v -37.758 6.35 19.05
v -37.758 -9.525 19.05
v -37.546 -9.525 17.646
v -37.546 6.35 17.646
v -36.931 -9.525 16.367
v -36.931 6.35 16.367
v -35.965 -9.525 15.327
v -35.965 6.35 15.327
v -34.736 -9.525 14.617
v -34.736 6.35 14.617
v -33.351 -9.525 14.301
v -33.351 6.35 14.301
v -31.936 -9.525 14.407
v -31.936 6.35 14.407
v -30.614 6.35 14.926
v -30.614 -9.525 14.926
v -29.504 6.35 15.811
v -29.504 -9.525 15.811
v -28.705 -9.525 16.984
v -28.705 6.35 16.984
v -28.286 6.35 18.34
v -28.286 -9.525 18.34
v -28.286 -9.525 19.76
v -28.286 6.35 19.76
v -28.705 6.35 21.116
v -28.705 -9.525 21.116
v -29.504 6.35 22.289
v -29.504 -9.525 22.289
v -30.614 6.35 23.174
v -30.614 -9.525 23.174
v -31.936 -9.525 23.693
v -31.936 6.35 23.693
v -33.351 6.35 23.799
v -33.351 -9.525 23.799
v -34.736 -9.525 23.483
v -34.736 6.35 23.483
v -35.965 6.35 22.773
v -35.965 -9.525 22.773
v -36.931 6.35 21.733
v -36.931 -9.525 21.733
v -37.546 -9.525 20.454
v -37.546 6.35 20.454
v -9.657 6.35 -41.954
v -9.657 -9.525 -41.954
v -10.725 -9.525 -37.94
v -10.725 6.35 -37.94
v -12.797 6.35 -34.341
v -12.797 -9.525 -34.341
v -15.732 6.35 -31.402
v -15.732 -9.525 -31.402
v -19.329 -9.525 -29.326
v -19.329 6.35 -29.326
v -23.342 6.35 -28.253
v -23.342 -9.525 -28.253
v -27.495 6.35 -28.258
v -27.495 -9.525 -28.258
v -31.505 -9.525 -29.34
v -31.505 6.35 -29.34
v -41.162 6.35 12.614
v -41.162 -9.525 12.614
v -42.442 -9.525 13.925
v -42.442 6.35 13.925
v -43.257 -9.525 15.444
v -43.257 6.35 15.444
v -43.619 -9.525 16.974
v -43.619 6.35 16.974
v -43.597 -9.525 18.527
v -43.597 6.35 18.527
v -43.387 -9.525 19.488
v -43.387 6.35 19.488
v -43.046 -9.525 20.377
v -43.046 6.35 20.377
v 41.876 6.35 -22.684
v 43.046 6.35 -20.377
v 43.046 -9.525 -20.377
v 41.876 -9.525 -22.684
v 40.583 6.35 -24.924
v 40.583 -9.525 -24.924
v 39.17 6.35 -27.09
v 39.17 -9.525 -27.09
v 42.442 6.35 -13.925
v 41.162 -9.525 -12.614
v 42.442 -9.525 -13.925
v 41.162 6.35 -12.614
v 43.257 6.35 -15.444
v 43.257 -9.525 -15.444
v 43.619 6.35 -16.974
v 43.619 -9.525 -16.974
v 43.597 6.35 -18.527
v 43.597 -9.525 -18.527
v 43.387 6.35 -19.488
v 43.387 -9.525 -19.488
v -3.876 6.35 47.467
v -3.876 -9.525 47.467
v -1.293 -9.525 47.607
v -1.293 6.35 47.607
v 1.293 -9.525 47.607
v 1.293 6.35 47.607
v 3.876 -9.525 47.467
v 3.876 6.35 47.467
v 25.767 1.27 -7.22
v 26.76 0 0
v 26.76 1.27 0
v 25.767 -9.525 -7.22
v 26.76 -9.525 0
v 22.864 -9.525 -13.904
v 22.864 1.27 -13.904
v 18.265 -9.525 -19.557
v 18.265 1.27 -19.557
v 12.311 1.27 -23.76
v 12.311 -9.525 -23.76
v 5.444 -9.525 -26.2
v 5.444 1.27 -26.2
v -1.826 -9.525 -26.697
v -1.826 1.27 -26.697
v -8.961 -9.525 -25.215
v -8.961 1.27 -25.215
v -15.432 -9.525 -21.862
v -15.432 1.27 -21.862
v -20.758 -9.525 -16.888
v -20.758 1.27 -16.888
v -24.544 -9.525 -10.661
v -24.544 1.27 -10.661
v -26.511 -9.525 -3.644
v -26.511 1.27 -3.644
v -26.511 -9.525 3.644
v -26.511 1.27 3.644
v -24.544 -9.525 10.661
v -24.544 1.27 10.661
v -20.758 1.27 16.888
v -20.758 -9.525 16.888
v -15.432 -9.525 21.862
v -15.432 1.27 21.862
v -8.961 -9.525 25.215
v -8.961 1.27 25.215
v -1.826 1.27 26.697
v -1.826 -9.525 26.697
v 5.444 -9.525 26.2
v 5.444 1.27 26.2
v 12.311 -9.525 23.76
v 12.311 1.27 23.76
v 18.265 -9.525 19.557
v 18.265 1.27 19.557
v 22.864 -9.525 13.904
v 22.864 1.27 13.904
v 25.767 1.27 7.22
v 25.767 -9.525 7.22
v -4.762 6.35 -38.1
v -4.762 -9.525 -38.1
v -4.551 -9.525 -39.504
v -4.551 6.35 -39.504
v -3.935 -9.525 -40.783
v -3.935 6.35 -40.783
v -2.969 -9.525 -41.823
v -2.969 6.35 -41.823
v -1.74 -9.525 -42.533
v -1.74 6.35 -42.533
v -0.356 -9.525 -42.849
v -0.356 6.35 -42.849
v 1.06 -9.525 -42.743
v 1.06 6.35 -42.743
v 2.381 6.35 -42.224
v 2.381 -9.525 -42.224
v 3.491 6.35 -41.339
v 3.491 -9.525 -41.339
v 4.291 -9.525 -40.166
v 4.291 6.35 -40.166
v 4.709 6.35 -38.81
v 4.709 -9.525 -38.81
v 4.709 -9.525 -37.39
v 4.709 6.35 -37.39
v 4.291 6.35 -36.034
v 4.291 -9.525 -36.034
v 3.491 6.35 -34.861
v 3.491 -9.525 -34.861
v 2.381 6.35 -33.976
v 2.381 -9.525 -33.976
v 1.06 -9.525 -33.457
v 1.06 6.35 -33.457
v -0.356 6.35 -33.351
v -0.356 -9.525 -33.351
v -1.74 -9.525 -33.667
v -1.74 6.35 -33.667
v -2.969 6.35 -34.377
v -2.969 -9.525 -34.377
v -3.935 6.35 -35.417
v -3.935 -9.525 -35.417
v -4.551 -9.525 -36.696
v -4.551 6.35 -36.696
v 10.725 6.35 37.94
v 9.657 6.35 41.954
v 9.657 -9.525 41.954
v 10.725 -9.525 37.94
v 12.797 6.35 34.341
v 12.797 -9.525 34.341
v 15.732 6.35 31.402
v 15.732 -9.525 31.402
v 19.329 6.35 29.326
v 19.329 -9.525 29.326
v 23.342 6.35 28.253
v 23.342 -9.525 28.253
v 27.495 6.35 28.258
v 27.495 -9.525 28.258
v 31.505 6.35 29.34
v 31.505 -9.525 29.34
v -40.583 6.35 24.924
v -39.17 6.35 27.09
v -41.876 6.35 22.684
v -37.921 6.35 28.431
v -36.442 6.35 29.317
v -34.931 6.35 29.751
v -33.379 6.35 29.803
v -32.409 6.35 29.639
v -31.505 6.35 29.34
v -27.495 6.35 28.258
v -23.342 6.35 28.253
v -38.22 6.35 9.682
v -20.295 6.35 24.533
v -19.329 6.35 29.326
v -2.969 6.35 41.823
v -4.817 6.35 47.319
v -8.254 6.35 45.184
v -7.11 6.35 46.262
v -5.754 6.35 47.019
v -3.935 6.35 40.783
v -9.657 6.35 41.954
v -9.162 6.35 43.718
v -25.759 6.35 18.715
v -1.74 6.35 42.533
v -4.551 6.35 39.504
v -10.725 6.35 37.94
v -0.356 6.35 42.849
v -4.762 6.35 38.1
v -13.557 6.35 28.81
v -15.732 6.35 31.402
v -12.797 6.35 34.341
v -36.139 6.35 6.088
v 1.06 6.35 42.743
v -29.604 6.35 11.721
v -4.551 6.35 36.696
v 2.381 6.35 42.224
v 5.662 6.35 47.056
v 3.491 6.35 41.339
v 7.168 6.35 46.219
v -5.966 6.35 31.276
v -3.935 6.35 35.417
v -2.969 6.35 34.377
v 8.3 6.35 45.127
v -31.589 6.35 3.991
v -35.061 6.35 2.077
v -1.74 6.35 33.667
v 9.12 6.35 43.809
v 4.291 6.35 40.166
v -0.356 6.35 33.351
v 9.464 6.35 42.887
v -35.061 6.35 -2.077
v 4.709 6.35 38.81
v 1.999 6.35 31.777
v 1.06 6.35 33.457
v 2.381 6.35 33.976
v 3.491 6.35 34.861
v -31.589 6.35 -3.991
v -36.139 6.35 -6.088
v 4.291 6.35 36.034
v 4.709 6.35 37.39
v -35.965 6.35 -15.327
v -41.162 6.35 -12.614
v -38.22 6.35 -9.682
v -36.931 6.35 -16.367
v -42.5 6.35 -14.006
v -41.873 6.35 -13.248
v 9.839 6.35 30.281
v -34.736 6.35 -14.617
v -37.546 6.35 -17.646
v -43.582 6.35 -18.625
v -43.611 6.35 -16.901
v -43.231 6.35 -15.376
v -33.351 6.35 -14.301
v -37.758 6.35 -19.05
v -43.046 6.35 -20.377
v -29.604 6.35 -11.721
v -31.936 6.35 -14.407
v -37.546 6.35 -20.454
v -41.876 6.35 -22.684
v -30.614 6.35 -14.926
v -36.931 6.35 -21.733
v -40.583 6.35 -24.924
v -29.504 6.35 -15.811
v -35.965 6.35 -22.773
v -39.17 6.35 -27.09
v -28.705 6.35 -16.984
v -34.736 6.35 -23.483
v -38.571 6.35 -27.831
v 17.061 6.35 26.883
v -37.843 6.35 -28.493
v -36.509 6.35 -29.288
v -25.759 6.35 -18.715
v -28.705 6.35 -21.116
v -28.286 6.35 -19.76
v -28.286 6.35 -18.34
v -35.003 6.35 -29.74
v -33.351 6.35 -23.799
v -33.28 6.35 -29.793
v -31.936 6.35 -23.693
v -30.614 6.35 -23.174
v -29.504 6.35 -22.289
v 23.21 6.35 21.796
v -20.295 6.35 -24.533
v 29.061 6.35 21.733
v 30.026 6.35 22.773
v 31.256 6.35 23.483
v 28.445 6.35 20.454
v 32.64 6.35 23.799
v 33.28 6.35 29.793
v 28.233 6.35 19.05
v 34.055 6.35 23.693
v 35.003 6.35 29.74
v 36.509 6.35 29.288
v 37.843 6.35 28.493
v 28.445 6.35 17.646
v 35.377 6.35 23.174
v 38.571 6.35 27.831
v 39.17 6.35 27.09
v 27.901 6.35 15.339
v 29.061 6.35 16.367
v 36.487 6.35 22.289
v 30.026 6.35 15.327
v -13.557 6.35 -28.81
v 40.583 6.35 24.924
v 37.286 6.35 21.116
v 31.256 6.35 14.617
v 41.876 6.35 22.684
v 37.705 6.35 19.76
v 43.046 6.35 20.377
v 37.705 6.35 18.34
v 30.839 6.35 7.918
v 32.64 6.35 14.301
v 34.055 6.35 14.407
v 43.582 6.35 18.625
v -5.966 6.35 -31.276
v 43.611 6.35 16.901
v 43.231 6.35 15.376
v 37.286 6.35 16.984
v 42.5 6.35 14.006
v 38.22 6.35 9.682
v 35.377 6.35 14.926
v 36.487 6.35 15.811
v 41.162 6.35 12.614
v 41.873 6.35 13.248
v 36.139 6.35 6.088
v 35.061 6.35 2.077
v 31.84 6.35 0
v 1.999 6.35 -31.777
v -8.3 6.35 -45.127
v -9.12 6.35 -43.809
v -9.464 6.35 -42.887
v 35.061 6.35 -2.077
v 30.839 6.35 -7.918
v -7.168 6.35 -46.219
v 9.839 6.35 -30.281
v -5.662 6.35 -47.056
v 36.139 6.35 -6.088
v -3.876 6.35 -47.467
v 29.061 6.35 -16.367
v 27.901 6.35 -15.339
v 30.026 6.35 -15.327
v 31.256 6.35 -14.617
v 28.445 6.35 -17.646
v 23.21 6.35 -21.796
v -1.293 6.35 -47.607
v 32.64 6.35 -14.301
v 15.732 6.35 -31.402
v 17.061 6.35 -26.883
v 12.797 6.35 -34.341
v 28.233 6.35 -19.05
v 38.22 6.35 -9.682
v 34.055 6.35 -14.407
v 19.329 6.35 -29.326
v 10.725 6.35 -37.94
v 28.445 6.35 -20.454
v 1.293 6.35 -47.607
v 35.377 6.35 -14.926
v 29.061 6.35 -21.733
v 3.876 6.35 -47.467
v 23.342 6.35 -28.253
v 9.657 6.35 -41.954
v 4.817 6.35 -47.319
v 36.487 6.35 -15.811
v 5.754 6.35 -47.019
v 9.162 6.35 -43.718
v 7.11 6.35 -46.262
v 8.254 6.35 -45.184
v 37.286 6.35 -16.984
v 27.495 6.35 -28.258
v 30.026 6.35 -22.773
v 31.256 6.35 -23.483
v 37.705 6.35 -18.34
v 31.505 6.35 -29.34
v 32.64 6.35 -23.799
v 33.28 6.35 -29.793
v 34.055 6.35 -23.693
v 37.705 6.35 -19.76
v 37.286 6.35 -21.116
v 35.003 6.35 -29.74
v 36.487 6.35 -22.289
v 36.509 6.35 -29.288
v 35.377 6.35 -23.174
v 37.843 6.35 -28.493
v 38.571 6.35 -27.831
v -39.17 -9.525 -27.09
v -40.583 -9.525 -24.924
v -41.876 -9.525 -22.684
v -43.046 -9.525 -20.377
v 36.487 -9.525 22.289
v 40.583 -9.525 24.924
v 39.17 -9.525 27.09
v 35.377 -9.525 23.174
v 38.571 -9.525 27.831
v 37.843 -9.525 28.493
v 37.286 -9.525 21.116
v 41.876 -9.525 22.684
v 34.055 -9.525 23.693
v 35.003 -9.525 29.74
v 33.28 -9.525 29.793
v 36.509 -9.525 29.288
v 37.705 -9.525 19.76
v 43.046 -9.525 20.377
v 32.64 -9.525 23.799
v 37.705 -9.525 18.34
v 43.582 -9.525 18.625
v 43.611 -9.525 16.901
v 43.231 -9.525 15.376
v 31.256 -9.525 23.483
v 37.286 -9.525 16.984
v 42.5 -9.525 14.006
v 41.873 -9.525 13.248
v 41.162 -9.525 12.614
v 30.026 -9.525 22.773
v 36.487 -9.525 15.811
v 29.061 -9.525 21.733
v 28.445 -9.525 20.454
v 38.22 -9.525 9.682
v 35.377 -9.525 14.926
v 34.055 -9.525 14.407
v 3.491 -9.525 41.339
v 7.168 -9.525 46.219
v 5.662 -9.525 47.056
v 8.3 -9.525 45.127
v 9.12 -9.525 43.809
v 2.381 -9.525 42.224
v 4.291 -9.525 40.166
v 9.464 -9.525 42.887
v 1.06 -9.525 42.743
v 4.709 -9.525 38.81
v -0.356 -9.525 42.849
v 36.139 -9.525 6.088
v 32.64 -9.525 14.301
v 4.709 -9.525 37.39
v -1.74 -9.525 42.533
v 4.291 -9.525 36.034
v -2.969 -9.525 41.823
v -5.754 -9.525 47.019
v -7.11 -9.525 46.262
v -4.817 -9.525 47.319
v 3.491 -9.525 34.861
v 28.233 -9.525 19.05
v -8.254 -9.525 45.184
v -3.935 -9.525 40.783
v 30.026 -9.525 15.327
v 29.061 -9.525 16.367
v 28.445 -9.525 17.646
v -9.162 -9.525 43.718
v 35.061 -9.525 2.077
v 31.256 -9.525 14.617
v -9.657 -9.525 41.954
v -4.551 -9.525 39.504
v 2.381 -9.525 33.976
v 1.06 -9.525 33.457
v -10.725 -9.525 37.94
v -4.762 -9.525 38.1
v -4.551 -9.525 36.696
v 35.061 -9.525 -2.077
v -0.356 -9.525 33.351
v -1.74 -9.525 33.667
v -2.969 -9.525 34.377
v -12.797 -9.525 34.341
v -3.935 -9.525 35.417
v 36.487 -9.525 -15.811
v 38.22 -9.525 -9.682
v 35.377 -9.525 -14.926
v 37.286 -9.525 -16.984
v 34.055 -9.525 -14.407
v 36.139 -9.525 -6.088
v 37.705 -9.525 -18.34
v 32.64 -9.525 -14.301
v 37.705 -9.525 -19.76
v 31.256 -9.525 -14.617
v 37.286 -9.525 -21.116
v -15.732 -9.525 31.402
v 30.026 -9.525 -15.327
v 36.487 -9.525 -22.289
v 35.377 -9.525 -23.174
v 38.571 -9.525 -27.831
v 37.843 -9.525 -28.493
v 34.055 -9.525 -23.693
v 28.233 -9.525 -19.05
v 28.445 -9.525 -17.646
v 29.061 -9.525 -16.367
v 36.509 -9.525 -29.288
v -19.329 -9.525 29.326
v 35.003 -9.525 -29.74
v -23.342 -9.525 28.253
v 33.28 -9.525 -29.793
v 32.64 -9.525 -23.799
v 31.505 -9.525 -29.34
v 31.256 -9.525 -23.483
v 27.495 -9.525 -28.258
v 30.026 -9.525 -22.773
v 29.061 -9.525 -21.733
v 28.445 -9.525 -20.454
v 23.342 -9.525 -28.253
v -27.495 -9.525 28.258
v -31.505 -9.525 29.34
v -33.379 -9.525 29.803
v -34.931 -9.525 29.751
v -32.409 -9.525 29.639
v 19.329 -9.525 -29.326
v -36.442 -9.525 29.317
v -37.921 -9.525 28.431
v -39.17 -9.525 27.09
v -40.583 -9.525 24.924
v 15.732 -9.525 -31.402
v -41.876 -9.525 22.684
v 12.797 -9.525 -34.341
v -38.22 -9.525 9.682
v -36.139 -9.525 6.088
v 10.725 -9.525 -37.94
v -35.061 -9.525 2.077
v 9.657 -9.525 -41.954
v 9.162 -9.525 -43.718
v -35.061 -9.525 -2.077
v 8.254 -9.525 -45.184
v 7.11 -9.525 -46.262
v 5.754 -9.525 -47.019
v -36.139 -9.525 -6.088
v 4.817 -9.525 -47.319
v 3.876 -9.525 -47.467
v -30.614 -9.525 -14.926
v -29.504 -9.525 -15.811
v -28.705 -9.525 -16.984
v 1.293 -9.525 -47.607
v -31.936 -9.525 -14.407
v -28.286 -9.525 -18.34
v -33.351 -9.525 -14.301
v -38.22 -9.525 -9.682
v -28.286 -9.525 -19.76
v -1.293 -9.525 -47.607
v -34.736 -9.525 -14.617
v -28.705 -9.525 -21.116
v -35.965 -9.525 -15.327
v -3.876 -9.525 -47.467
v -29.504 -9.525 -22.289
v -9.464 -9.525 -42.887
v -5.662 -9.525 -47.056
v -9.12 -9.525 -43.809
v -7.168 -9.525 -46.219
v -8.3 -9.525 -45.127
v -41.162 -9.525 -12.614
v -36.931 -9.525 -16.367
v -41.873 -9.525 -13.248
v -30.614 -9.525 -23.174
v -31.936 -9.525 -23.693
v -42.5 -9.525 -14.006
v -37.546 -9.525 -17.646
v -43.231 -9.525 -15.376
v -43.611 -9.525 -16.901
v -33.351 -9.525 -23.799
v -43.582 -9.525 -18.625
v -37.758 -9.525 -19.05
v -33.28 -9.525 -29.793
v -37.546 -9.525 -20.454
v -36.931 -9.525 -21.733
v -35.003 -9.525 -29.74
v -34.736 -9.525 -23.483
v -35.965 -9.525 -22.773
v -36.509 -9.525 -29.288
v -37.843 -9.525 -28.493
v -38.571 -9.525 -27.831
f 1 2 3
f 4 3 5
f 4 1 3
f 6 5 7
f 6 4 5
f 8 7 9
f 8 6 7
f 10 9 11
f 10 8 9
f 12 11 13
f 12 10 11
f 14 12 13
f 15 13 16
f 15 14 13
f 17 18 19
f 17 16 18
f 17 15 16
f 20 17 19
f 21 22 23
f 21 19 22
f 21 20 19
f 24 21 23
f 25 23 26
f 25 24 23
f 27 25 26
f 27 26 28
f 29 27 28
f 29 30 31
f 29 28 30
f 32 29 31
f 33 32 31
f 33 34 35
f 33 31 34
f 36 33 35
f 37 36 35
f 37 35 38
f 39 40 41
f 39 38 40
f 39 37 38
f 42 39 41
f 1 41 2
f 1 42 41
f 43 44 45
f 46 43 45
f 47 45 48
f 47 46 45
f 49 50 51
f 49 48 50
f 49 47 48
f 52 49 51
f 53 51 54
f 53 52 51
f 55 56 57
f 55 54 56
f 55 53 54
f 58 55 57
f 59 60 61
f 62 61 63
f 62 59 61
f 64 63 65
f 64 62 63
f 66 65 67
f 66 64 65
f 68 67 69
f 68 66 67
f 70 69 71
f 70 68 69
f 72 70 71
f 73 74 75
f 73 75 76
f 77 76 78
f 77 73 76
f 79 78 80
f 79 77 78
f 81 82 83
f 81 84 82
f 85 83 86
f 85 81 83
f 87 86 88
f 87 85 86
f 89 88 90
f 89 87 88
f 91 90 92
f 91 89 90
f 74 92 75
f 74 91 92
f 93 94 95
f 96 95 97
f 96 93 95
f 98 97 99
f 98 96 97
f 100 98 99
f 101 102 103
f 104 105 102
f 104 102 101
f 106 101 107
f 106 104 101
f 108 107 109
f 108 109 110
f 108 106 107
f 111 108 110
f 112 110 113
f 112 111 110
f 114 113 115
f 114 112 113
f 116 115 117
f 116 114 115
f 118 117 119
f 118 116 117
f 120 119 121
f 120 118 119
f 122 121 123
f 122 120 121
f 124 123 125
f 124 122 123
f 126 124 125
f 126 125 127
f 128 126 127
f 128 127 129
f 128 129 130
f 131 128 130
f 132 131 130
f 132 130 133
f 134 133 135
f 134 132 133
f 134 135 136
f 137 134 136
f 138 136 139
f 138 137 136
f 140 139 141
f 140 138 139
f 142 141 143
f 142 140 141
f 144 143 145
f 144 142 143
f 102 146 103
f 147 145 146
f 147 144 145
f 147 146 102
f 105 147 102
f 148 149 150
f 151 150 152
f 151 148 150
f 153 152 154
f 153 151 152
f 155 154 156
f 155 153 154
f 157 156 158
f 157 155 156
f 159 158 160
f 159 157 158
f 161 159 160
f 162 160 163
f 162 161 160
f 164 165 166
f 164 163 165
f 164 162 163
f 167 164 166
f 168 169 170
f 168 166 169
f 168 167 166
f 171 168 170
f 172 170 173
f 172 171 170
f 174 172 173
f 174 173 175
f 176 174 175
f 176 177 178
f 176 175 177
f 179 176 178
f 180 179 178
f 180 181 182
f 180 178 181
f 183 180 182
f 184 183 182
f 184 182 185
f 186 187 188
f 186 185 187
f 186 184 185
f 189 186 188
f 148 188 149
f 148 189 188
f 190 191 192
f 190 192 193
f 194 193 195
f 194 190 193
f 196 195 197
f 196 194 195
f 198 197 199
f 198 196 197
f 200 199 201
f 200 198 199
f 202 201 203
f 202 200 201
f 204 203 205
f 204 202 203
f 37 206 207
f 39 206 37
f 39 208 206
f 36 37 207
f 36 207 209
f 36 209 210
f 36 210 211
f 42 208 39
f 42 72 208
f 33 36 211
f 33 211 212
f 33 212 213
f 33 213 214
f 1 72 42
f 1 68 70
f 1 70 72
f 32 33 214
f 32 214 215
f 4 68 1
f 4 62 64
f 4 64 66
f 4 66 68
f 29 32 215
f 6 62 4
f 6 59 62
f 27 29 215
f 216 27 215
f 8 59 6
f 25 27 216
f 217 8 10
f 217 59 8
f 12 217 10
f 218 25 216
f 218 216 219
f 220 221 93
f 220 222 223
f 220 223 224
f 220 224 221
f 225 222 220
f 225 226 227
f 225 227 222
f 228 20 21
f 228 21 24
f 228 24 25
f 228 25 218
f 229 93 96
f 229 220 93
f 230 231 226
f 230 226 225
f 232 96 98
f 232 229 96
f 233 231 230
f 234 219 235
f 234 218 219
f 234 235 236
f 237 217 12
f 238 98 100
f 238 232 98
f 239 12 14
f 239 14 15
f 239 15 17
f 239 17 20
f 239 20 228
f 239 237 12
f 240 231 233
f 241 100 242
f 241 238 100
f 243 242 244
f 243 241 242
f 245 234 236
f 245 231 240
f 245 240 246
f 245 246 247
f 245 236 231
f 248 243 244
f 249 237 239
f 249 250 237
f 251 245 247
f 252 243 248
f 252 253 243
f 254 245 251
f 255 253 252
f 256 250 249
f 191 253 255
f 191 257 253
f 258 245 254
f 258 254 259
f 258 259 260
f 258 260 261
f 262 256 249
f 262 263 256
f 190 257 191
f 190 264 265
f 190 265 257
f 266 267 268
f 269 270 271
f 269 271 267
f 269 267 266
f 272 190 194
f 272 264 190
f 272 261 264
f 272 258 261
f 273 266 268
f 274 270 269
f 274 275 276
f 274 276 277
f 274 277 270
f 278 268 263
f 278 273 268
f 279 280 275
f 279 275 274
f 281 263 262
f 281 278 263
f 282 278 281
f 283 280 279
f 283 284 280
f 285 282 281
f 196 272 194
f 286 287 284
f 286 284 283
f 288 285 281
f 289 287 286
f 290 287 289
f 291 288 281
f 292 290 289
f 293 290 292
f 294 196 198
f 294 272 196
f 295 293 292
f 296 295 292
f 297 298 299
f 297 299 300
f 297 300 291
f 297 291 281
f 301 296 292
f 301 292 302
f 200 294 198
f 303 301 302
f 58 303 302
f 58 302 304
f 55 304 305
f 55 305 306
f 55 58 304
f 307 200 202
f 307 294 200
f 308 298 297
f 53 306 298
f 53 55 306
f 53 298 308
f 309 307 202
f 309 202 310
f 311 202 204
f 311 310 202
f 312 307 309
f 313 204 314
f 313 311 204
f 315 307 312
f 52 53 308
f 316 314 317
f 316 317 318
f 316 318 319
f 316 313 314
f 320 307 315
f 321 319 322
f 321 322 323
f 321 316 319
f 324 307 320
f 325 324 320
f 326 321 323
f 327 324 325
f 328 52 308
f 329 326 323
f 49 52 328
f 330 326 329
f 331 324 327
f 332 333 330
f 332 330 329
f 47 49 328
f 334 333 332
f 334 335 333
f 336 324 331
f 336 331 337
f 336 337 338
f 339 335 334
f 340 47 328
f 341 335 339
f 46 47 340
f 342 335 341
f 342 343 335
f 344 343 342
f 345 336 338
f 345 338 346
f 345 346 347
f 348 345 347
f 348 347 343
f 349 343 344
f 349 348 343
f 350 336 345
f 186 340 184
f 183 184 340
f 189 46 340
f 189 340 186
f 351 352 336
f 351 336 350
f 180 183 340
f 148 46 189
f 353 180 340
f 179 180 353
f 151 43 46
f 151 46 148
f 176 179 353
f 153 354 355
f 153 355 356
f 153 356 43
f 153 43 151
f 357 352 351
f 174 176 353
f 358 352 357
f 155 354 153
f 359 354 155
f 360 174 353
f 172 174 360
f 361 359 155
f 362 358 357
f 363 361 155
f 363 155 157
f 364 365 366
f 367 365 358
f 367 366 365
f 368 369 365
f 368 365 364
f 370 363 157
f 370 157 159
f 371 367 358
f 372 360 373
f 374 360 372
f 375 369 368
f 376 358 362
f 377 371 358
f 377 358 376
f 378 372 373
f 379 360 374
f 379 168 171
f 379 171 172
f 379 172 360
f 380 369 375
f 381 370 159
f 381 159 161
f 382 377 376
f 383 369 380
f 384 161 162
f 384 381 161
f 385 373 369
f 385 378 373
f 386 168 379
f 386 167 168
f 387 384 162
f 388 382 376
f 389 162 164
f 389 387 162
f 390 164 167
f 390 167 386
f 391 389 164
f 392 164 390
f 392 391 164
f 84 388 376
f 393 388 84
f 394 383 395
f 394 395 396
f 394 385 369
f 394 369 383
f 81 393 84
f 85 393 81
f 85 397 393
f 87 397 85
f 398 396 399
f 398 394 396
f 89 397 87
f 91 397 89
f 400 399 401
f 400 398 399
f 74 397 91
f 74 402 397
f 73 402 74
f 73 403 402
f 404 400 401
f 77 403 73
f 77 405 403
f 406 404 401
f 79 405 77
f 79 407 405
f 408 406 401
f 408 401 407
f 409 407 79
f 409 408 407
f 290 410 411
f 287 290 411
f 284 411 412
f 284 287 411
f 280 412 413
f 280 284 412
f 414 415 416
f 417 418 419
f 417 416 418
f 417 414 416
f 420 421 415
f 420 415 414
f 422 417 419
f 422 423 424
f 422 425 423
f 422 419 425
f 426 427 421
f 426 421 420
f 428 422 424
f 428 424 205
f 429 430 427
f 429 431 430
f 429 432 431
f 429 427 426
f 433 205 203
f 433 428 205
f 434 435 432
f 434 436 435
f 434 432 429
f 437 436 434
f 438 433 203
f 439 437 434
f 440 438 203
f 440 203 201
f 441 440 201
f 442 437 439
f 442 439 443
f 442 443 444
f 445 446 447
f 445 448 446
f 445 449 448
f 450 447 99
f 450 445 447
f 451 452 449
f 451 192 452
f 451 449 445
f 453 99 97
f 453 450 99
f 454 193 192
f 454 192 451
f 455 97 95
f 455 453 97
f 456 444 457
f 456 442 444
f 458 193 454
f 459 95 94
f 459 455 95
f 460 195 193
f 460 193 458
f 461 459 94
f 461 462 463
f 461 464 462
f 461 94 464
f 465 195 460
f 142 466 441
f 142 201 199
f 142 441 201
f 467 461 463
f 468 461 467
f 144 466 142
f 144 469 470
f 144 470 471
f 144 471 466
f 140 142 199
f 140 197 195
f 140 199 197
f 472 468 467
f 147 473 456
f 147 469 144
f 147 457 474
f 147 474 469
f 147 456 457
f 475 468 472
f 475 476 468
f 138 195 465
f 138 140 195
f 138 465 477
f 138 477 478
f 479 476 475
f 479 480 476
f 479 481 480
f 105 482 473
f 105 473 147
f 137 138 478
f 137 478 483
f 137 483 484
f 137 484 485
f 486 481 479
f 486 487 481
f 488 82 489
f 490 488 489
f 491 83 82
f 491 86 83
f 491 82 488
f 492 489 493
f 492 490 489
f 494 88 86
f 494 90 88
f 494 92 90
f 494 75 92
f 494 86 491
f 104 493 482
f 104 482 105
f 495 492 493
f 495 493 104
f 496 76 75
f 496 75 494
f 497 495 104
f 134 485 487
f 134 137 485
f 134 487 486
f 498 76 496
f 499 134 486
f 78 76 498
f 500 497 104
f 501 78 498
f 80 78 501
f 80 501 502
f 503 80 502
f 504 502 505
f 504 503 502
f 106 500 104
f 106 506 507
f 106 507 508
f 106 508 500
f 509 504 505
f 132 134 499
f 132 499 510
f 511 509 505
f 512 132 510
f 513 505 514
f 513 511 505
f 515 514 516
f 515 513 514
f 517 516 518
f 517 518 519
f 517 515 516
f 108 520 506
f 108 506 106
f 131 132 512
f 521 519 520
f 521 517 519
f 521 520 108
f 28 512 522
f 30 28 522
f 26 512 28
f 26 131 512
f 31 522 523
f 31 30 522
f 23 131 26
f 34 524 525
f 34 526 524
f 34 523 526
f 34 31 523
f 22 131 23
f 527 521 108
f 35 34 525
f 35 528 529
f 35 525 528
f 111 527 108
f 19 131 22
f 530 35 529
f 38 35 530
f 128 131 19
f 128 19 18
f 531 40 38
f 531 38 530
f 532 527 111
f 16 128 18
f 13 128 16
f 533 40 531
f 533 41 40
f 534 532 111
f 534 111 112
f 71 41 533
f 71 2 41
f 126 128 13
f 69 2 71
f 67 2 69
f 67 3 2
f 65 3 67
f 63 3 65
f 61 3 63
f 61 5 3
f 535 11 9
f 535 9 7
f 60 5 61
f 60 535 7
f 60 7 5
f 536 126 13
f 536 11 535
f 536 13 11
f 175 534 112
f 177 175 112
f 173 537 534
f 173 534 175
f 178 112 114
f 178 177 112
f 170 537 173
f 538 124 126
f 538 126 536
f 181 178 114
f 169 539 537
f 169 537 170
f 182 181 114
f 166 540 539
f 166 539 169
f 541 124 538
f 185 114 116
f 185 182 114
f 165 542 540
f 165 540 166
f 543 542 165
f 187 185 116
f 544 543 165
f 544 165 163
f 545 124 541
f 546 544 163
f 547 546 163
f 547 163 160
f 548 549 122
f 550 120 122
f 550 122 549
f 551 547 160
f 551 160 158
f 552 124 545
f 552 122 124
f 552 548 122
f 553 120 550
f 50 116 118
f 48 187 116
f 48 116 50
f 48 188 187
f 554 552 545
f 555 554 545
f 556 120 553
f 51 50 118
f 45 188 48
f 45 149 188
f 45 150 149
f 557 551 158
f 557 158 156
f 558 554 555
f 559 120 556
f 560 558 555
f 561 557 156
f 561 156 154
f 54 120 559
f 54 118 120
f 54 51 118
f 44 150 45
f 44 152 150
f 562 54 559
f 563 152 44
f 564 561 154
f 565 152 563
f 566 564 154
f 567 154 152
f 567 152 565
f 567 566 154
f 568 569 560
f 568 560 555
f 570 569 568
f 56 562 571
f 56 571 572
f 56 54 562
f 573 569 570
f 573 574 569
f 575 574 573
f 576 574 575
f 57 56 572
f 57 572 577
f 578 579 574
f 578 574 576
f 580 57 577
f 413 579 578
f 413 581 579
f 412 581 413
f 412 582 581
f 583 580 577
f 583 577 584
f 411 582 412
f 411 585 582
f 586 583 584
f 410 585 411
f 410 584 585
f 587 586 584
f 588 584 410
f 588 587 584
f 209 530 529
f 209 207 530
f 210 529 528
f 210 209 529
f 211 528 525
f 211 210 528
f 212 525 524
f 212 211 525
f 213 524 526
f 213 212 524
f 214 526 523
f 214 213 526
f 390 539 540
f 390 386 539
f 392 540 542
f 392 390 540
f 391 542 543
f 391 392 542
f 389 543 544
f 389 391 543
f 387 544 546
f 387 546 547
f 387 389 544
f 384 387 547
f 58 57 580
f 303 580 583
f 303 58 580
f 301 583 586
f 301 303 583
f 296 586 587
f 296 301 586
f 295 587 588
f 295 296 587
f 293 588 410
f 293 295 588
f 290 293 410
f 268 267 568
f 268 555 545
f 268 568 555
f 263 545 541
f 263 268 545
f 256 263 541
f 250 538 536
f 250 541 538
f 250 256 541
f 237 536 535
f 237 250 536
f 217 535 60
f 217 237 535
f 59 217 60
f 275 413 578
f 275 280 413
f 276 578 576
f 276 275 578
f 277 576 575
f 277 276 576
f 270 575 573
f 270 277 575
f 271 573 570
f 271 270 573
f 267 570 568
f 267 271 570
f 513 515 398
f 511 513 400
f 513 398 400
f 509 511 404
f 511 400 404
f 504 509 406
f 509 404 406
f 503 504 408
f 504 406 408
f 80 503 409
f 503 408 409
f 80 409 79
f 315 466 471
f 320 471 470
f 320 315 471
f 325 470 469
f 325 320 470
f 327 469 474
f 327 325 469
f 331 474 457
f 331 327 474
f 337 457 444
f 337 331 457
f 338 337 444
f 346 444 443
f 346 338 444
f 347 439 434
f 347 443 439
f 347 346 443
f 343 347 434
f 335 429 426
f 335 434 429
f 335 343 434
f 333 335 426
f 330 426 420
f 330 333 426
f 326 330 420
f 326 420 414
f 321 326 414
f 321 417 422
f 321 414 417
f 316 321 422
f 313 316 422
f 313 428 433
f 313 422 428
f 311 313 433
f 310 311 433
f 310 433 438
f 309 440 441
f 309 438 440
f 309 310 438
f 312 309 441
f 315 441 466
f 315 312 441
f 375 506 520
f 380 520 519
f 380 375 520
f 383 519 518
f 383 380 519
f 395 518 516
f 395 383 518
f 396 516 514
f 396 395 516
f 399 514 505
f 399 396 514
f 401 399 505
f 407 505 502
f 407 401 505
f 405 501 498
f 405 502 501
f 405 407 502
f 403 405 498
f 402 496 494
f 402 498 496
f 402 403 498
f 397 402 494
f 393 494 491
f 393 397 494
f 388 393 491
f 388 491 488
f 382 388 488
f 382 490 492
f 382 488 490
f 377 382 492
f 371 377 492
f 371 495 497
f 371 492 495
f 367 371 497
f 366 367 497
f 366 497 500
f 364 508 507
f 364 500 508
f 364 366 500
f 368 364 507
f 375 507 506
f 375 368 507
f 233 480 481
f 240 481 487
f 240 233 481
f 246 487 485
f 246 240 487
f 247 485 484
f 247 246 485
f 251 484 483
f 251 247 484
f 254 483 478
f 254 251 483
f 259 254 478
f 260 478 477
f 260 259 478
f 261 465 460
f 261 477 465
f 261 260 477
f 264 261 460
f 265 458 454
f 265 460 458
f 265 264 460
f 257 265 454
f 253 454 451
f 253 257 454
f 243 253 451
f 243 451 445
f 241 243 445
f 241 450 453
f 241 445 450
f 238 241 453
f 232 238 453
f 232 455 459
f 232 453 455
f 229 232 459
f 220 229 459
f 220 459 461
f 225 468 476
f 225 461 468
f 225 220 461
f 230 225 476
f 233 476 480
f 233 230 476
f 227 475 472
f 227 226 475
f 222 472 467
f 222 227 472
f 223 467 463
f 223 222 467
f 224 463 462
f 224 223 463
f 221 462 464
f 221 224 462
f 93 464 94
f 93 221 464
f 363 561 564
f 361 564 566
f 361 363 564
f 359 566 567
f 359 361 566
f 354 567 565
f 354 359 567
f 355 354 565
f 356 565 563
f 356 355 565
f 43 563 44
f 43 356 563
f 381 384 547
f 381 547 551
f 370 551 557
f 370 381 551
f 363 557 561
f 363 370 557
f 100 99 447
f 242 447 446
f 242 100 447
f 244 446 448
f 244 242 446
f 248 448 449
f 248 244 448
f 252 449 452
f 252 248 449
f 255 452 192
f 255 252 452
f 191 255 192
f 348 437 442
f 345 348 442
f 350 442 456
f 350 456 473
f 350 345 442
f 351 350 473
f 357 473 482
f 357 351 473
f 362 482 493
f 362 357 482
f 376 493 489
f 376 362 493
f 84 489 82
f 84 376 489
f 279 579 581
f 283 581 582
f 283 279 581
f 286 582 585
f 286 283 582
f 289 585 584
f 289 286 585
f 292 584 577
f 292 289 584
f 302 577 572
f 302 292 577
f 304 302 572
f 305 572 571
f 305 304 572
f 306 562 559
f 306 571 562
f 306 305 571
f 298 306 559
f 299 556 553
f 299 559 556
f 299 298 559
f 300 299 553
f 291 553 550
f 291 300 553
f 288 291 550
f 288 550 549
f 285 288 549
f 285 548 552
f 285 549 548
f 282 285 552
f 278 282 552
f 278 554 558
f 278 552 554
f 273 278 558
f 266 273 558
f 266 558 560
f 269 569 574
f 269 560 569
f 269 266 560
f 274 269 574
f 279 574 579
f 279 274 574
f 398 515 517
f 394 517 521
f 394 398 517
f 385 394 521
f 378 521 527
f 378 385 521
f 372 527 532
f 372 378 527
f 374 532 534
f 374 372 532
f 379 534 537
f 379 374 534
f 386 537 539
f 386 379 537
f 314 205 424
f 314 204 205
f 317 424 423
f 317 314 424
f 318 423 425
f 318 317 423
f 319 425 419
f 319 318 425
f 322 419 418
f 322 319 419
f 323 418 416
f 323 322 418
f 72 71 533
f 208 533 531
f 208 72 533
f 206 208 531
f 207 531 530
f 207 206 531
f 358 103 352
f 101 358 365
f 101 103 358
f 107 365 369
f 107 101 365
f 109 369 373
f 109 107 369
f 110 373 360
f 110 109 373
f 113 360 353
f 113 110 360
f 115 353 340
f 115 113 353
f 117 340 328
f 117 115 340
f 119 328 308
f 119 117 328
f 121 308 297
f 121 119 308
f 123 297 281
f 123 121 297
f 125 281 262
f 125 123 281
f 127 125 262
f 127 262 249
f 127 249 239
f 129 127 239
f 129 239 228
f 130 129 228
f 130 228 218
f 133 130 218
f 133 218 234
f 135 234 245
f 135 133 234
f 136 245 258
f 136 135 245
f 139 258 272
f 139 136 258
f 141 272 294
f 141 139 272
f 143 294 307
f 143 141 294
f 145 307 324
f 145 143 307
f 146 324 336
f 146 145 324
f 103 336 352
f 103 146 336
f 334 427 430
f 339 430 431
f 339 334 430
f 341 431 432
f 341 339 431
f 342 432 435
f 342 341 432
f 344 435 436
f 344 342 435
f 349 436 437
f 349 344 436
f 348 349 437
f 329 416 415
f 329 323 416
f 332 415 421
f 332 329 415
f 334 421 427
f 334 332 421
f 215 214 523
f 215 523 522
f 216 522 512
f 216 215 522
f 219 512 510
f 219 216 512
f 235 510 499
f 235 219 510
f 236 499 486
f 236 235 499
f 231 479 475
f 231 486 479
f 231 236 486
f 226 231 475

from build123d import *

# Parameters (mm, degrees)
SKETCH1_W               = 20.865197439
SKETCH1_H               = 9.525
SKETCH2_R               = 4.7625
SKETCH2_R_2             = 15.875
CUT_EXTRUDE1_DEPTH      = 16.875
CUT_EXTRUDE1_DEPTH_BACK = 1
FILLET1_R               = 6.35


with BuildPart() as part:
    # Sketch1 → Revolve1 (revolve)
    with BuildSketch(Plane.XY):
        Polygon((31.839802561, 6.35), (26.759802561, 1.27), (26.759802561, 0), (47.625, 0), (47.625, 6.35), align=None)
        with Locations((37.192401281, -4.7625)):
            Rectangle(SKETCH1_W, SKETCH1_H)
    revolve(axis=Axis((0, 0, 0), (0, 1, 0)))

    # Sketch2 → Cut-Extrude1 (cut, two sides)
    with BuildSketch(Plane(origin=(0, 6.35, 0), x_dir=(-1, 0, 0), z_dir=(0, -1, 0))) as cut_extrude1_sk:
        with Locations((0, 38.1)):
            Circle(SKETCH2_R)
        with Locations((32.995567884, 19.05)):
            Circle(SKETCH2_R)
        with Locations((32.995567884, -19.05)):
            Circle(SKETCH2_R)
        with Locations((0, -38.1)):
            Circle(SKETCH2_R)
        with Locations((-32.995567884, -19.05)):
            Circle(SKETCH2_R)
        with Locations((-32.995567884, 19.05)):
            Circle(SKETCH2_R)
        with Locations((50.8, 0)):
            Circle(SKETCH2_R_2)
        with Locations((25.4, -43.994090512)):
            Circle(SKETCH2_R_2)
        with Locations((-25.4, -43.994090512)):
            Circle(SKETCH2_R_2)
        with Locations((-50.8, 0)):
            Circle(SKETCH2_R_2)
        with Locations((-25.4, 43.994090512)):
            Circle(SKETCH2_R_2)
        with Locations((25.4, 43.994090512)):
            Circle(SKETCH2_R_2)
    extrude(amount=CUT_EXTRUDE1_DEPTH, mode=Mode.SUBTRACT)
    extrude(cut_extrude1_sk.sketch, amount=-CUT_EXTRUDE1_DEPTH_BACK, mode=Mode.SUBTRACT)

    # Fillet1
    fillet1_edges = [part.edges().sort_by_distance(p)[0] for p in [
        (-35.500453462, -1.5875, 31.746786121),
        (-9.743296538, -1.5875, 46.617687604),
        (-45.24375, -1.5875, -14.870901484),
        (-45.24375, -1.5875, 14.870901484),
        (9.743296538, -1.5875, 46.617687604),
        (35.500453462, -1.5875, 31.746786121),
        (45.24375, -1.5875, 14.870901484),
        (45.24375, -1.5875, -14.870901484),
        (35.500453462, -1.5875, -31.746786121),
        (9.743296538, -1.5875, -46.617687604),
        (-9.743296538, -1.5875, -46.617687604),
        (-35.500453462, -1.5875, -31.746786121),
    ]]
    fillet(fillet1_edges, radius=FILLET1_R)


solid = part.part
